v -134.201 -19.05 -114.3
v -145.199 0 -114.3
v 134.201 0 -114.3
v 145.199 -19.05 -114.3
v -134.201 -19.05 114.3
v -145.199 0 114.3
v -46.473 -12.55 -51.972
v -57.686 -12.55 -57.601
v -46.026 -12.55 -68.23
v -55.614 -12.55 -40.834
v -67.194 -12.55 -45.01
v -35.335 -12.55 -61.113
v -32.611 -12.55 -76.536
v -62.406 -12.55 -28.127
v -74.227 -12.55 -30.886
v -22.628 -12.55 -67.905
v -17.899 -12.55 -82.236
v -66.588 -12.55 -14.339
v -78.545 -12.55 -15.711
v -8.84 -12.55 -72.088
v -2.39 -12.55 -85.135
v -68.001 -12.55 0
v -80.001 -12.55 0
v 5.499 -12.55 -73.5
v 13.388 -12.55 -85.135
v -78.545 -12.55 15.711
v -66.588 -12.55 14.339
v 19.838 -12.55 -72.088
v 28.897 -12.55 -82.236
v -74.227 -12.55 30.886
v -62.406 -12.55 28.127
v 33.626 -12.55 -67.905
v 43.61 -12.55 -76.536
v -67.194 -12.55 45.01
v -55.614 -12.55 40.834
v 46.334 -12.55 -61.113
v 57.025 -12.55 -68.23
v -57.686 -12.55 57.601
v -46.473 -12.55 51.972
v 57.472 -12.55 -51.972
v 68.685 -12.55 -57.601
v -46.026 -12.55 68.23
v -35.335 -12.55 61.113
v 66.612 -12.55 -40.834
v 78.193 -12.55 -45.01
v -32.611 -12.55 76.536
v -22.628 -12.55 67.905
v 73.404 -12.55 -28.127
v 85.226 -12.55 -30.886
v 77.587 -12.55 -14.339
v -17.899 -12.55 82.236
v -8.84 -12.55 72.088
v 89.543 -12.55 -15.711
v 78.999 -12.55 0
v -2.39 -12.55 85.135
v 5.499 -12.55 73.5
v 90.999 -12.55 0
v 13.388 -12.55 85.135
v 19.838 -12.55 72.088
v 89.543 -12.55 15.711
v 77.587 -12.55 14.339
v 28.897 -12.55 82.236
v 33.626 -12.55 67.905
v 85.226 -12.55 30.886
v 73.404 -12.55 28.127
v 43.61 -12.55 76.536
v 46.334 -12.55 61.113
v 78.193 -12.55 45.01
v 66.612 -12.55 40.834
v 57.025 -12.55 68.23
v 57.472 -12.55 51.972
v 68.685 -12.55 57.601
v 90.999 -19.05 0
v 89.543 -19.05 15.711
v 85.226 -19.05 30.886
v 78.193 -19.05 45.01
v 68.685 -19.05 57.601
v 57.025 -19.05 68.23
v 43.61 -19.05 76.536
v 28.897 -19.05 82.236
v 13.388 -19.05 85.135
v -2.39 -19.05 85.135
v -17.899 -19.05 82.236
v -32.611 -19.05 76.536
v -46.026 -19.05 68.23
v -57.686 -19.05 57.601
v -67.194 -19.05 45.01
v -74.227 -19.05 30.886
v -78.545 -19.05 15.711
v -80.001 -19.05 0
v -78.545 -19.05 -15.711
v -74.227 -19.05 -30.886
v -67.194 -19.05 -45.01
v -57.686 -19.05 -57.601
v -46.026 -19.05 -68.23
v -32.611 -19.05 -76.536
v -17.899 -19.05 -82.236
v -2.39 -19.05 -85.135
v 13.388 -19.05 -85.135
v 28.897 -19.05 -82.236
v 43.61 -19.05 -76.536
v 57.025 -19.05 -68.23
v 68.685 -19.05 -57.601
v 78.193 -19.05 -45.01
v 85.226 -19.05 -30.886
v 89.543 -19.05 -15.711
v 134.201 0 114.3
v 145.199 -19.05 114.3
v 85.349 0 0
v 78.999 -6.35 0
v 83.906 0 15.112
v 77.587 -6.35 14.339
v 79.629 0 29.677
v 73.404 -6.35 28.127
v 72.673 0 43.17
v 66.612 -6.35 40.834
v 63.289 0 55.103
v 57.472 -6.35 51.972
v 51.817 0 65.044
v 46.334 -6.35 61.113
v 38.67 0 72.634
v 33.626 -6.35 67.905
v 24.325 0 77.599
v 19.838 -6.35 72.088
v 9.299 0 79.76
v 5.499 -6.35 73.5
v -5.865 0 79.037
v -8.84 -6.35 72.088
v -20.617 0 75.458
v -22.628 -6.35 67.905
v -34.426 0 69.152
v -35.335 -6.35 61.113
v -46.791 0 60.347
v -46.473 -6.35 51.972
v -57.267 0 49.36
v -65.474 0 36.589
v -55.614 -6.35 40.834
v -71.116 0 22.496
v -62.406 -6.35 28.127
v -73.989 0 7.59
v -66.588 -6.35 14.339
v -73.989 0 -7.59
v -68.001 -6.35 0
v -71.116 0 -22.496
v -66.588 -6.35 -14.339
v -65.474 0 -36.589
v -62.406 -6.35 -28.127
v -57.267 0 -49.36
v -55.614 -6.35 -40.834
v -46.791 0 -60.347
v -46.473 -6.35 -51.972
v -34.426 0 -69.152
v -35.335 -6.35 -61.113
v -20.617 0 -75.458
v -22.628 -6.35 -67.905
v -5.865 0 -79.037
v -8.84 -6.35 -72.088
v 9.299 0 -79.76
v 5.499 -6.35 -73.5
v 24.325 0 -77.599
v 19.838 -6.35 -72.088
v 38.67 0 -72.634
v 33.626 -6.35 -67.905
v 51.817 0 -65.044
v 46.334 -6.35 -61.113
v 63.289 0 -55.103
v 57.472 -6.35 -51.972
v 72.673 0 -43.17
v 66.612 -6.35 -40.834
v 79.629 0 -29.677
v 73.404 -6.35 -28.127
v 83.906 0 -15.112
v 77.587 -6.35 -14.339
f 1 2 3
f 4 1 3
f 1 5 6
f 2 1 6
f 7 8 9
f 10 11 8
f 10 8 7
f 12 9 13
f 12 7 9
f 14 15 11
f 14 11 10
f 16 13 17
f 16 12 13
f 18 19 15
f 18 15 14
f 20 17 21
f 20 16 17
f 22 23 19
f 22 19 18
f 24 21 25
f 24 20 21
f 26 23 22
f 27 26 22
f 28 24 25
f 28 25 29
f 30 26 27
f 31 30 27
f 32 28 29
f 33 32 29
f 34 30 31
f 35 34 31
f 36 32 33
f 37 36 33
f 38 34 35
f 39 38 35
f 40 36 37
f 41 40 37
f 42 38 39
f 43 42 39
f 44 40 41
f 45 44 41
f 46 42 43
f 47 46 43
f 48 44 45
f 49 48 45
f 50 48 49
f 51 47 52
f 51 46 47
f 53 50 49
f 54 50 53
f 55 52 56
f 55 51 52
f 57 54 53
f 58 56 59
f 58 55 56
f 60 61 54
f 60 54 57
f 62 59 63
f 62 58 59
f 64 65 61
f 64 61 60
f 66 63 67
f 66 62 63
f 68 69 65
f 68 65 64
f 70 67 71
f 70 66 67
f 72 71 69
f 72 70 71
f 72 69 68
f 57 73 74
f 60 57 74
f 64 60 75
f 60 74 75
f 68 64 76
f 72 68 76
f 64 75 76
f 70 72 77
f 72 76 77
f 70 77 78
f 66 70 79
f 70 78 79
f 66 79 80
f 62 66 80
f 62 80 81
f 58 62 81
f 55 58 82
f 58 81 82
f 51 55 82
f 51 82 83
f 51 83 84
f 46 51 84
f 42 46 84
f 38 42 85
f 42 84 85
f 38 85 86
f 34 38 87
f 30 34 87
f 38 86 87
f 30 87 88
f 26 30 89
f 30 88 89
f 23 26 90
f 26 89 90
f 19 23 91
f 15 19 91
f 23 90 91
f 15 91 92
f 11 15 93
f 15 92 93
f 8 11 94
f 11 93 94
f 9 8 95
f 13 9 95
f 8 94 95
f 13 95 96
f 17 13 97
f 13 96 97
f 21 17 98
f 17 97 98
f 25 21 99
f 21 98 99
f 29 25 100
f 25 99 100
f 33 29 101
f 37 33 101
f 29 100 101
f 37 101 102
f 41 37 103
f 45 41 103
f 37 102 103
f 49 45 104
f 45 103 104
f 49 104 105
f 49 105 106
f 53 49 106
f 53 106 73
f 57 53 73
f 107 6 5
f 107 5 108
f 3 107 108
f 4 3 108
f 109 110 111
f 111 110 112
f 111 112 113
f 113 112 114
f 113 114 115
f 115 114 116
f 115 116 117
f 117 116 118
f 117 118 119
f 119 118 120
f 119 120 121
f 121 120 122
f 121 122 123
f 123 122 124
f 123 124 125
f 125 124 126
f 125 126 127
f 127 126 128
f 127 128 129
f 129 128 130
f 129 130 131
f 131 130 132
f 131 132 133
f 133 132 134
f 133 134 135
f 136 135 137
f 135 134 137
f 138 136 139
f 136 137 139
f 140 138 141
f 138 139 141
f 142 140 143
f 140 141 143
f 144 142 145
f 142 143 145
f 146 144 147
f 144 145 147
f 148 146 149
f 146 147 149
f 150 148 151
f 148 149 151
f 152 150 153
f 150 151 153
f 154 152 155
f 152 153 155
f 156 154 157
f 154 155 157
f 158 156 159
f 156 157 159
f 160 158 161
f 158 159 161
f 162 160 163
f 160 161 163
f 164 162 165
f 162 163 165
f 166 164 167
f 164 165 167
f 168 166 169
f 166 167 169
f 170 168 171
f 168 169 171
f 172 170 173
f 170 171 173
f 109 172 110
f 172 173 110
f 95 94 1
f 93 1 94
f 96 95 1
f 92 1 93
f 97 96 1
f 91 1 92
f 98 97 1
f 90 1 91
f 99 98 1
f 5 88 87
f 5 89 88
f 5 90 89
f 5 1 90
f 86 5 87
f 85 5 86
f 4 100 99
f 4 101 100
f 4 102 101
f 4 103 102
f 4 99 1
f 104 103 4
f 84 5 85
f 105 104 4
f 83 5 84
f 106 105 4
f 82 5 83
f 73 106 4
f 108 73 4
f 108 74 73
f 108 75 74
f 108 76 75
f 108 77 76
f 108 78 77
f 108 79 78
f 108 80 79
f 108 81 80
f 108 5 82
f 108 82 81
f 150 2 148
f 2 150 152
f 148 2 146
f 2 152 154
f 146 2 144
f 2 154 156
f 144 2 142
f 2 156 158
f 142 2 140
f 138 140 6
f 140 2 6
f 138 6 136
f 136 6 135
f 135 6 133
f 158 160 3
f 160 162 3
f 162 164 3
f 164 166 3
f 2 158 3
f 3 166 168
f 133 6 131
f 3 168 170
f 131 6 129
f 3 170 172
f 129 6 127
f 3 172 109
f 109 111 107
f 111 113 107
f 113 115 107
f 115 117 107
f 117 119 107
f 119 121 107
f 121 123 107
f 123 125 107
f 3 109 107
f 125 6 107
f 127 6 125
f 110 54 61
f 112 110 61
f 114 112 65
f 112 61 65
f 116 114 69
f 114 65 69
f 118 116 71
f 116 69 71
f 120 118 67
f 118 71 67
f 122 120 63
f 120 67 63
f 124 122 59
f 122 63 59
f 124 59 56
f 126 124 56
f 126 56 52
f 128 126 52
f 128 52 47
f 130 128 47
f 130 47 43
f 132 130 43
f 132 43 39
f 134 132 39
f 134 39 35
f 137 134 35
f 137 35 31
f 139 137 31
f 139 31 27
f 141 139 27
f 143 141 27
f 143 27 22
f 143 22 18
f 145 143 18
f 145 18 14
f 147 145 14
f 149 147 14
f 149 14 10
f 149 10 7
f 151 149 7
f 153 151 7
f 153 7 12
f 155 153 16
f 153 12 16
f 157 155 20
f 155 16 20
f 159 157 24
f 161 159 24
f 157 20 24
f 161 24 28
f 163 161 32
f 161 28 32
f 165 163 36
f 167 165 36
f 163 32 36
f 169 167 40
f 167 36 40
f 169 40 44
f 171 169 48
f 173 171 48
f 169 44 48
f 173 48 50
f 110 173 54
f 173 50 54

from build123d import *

# Parameters (mm, degrees)
F0_W     = 290.3982
F0_H     = 228.6
F1_DEPTH = 19.05
F3_DEPTH = 228.601
F4_R     = 85.5
F5_DEPTH = 6.5
F6_R     = 73.5
F7_DEPTH = 12.551
F8_SIZE  = 6.35


with BuildPart() as f1:
    # F0 (on Front) → F1 (new body)
    with BuildSketch(Plane.XZ):
        Rectangle(F0_W, F0_H)
    extrude(amount=F1_DEPTH)

    # F2 (on face) → F3 (cut, through all)
    with BuildSketch(Plane.XY.offset(114.3)):
        Polygon((-134.200577, -19.05), (-145.1991, 0), (-145.1991, -19.05), align=None)
        Polygon((134.200577, 0), (145.1991, -19.05), (145.1991, 0), align=None)
    extrude(amount=-F3_DEPTH, mode=Mode.SUBTRACT)

    # F4 (on face) → F5 (cut)
    with BuildSketch(Plane.XZ.offset(19.05)):
        with Locations((5.499261, 0)):
            Circle(F4_R)
    extrude(amount=-F5_DEPTH, mode=Mode.SUBTRACT)

    # F6 (on face) → F7 (cut, through all)
    with BuildSketch(Plane.XZ.offset(12.55)):
        with Locations((5.499261, 0)):
            Circle(F6_R)
    extrude(amount=-F7_DEPTH, mode=Mode.SUBTRACT)

    # F8
    f8_edges = [f1.edges().sort_by_distance(p)[0] for p in [
        (-68.000739, 0, 0),
    ]]
    chamfer(f8_edges, length=F8_SIZE)


solid = f1.part
